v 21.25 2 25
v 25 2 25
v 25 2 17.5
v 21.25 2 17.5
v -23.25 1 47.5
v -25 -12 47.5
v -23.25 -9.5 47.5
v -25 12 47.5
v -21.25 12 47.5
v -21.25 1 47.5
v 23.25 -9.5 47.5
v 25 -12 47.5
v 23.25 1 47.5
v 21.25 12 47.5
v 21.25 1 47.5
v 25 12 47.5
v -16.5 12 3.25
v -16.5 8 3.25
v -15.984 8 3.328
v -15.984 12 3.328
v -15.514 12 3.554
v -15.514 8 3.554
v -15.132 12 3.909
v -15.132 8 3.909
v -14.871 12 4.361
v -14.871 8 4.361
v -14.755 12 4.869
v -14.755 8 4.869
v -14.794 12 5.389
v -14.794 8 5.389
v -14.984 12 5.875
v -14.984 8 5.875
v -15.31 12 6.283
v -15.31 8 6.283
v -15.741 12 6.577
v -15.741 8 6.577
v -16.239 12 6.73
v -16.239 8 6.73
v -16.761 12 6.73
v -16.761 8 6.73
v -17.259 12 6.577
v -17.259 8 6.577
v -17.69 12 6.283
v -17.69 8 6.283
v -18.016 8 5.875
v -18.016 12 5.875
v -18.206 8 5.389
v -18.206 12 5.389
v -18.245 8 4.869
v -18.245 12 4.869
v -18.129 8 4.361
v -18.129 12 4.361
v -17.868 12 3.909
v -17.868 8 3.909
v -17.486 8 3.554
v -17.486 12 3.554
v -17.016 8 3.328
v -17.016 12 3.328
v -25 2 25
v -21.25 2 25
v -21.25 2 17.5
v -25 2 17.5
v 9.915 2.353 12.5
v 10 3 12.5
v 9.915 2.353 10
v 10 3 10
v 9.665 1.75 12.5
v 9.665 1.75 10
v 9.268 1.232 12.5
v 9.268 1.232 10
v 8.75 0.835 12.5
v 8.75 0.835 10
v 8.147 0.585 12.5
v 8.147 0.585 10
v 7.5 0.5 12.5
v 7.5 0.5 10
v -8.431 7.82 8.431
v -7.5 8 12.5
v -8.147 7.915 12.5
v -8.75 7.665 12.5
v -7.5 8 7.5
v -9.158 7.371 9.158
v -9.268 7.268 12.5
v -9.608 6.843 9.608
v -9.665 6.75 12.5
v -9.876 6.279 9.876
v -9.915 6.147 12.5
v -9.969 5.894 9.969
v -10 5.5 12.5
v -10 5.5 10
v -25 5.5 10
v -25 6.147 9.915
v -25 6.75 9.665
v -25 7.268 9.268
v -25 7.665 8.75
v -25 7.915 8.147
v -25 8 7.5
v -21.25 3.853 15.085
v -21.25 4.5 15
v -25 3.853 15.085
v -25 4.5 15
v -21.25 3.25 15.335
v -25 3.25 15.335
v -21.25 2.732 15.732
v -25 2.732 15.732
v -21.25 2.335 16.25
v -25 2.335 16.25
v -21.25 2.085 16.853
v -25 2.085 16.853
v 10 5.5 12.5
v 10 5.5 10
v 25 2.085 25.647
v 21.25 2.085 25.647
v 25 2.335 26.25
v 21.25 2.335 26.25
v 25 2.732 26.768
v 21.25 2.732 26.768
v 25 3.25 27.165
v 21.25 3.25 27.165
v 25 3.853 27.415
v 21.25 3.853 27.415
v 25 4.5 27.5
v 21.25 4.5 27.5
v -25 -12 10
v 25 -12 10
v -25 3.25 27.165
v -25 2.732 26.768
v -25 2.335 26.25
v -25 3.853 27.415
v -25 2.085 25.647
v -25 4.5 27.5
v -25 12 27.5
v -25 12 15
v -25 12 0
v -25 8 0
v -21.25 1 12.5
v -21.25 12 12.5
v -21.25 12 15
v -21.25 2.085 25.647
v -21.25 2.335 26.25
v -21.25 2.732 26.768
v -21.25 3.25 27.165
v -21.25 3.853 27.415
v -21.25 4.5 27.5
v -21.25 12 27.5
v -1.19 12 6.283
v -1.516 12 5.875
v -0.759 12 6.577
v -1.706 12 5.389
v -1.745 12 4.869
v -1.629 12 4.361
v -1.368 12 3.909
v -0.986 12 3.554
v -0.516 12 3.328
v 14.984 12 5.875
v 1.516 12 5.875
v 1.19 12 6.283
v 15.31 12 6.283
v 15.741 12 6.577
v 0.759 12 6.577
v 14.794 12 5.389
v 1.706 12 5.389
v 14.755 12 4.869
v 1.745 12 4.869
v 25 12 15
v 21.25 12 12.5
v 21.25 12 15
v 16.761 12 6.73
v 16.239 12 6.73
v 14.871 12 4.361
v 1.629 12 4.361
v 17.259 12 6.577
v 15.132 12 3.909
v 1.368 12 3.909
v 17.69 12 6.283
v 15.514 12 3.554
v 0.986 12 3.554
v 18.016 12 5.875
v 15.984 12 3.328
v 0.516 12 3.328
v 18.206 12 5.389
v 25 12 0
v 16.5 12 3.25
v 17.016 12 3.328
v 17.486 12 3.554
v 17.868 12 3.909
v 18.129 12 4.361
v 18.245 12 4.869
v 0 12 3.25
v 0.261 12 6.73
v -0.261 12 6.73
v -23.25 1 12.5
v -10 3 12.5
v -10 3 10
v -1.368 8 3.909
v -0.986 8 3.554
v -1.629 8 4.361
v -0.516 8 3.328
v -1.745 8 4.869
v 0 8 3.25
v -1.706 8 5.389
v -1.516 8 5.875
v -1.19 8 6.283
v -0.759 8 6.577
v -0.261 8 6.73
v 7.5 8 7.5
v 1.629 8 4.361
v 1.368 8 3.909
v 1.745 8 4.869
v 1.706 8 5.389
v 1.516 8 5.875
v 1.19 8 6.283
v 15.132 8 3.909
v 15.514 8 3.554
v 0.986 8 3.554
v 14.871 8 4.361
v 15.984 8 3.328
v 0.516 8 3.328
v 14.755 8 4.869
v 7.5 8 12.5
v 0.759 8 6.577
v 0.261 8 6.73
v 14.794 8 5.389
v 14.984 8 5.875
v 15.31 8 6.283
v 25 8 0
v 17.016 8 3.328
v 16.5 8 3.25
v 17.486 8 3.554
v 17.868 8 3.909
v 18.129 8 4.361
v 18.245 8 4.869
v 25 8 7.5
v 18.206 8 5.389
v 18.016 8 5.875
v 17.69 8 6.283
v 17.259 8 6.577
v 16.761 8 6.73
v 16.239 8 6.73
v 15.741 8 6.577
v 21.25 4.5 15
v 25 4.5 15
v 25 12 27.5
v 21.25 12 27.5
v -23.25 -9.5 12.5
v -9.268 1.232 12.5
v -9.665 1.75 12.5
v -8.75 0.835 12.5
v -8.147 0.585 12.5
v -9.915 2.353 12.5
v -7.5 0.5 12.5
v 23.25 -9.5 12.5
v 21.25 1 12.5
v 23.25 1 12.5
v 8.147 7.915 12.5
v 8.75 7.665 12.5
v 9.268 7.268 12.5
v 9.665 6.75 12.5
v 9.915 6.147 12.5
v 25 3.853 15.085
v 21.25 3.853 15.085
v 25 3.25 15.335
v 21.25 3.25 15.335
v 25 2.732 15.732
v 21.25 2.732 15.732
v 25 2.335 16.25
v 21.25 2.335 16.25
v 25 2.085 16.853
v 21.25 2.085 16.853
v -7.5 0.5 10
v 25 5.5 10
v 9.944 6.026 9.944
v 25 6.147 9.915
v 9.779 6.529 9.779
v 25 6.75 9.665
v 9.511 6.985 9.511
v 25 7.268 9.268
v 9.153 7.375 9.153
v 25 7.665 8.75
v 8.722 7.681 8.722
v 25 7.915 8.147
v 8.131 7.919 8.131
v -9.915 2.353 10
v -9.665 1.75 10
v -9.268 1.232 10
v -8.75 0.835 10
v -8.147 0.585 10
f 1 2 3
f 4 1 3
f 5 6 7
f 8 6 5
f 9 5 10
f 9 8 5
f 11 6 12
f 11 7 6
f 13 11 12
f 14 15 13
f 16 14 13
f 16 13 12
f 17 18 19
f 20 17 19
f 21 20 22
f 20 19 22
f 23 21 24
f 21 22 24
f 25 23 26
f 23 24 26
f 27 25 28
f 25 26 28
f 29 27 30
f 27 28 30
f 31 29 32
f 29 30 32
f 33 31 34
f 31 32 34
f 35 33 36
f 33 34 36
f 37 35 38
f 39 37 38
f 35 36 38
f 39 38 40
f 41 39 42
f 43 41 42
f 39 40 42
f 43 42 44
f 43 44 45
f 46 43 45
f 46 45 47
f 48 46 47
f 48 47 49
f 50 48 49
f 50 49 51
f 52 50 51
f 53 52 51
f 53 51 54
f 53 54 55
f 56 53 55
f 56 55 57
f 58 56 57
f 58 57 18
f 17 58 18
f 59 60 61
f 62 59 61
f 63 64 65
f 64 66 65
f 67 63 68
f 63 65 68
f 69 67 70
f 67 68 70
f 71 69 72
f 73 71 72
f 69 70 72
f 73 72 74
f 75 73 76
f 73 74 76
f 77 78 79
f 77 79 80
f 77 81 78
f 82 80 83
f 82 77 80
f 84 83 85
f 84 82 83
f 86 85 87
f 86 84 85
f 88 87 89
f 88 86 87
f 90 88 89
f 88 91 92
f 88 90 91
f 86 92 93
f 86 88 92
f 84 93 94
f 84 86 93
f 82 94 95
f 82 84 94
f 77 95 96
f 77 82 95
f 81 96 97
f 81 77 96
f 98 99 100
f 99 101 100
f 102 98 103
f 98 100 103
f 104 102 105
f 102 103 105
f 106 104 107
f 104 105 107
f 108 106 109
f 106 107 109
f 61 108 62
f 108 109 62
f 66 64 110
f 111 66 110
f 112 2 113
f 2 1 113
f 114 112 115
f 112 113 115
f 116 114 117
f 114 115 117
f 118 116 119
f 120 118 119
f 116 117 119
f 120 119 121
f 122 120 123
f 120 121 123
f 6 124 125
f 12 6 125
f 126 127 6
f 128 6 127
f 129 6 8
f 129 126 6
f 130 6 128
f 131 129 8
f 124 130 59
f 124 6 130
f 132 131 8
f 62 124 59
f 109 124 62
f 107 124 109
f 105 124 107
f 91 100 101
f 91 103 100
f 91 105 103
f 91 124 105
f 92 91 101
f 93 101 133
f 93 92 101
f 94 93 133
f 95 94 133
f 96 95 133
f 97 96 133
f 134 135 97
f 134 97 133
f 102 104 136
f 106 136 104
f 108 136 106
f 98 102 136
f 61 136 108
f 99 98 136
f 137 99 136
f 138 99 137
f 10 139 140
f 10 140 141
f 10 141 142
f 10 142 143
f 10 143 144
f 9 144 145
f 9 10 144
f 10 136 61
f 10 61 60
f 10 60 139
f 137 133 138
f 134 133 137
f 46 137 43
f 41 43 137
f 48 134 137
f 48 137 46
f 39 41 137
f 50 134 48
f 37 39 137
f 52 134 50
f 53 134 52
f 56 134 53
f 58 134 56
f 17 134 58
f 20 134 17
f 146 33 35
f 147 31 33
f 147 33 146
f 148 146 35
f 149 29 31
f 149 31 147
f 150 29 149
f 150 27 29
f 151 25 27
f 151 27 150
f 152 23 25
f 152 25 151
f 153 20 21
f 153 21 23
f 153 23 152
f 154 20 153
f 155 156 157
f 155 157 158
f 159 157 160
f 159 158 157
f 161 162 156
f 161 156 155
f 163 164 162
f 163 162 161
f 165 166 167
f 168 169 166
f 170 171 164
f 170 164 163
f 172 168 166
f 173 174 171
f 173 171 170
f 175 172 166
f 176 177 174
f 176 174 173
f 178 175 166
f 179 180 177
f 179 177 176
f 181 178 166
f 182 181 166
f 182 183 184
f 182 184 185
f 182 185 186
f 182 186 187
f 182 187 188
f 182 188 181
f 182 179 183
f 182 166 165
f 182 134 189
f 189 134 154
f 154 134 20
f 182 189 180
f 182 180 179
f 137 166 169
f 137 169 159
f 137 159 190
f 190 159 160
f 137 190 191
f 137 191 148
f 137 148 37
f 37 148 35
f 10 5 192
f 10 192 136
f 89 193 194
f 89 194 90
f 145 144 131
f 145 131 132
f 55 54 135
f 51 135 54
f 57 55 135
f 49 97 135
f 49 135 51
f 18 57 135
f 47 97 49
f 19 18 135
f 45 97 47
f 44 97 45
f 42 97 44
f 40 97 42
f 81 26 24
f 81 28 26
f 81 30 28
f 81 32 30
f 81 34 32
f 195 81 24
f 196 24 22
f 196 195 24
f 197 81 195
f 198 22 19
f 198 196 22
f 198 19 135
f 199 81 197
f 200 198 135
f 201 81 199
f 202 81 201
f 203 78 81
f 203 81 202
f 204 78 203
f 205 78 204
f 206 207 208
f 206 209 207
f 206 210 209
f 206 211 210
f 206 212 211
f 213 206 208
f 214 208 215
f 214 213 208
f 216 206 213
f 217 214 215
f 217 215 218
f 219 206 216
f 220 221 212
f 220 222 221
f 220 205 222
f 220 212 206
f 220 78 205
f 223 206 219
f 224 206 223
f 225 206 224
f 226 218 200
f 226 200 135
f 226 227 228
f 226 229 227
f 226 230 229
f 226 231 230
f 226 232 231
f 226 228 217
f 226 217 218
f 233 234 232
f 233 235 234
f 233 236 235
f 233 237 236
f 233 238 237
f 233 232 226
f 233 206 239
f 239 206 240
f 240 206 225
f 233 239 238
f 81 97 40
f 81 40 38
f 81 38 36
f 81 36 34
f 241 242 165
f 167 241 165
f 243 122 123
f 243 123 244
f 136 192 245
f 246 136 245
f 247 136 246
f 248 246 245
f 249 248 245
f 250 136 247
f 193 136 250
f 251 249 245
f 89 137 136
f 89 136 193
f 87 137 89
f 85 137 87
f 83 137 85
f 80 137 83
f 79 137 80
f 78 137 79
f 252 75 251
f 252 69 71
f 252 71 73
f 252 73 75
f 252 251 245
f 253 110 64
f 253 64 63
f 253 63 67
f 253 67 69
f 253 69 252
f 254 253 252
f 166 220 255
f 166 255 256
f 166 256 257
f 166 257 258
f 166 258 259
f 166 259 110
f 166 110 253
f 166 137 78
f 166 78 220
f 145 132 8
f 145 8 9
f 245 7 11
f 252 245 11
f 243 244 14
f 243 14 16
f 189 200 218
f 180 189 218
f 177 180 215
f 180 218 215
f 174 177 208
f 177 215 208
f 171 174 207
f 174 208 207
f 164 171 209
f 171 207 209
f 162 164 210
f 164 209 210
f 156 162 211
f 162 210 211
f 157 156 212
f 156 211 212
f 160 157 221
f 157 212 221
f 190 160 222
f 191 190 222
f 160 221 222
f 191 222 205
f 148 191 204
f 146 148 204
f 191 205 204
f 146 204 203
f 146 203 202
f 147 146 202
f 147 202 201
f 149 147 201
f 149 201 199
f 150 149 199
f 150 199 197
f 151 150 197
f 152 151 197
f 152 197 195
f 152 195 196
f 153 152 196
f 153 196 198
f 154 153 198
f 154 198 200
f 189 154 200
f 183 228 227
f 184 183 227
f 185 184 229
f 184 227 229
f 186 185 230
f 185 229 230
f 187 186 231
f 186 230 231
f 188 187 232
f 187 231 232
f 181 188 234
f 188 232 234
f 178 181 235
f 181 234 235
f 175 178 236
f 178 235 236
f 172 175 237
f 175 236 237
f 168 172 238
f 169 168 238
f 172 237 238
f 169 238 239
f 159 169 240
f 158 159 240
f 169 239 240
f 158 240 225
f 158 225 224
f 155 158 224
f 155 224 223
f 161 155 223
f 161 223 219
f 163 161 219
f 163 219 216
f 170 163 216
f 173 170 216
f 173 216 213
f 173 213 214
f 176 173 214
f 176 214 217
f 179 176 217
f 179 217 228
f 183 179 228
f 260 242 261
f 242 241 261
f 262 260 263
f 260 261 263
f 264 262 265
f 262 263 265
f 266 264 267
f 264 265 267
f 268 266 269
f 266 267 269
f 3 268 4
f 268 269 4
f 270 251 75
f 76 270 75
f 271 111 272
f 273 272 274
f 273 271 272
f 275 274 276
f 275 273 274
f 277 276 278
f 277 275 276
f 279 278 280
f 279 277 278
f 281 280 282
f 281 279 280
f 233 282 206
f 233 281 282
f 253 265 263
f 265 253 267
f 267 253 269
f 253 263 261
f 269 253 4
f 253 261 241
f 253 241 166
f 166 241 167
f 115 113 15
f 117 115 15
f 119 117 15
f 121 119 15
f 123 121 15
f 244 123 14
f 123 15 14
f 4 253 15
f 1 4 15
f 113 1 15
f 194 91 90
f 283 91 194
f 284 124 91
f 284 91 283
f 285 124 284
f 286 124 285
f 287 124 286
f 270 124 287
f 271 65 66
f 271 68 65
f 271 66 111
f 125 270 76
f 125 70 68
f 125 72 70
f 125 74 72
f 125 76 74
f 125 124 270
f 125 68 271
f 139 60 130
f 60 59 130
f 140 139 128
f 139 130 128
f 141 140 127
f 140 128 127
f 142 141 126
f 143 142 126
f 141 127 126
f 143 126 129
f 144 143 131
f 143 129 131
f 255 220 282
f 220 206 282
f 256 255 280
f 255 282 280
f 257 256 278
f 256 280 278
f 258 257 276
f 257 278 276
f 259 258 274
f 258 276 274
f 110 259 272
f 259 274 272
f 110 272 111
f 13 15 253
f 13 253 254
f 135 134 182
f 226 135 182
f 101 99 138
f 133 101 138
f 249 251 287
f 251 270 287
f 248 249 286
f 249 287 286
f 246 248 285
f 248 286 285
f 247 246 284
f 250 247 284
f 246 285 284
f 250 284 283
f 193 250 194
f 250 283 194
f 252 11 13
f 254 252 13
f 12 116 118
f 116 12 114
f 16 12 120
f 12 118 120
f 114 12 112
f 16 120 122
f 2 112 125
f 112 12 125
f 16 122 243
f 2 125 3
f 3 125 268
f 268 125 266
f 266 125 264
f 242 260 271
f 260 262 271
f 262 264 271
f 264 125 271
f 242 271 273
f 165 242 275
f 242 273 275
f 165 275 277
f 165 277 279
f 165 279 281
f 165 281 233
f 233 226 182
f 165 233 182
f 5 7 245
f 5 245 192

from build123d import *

# Parameters (mm, degrees)
SKETCH2_W           = 50
SKETCH2_H           = 24
SKETCH2_W_2         = 46.5
SKETCH2_H_2         = 10.5
SKETCH2_W_3         = 42.5
SKETCH2_H_3         = 11
BOSS_EXTRUDE1_DEPTH = 47.5
CUT_EXTRUDE1_START  = 47.5
SKETCH2_3_W         = 46.5
SKETCH2_3_H         = 10.5
SKETCH2_3_W_2       = 42.5
SKETCH2_3_H_2       = 11
CUT_EXTRUDE1_DEPTH  = 35
SKETCH3_W           = 50
SKETCH3_H           = 10
SKETCH3_R           = 1.75
CUT_EXTRUDE2_DEPTH  = 20
SKETCH3_3_R         = 1.75
CUT_EXTRUDE3_DEPTH  = 24
CUT_EXTRUDE4_REACH  = 72.002
SKETCH4_W           = 12.5
SKETCH4_H           = 10
SKETCH5_W           = 20
SKETCH5_H           = 7.5
CUT_EXTRUDE5_DEPTH  = 2.5
FILLET1_R           = 2.5


with BuildPart() as part:
    # Sketch2 → Boss-Extrude1 (new body)
    # profile 1 of 3: a face of its own
    with BuildSketch(Plane.XY):
        Rectangle(SKETCH2_W, SKETCH2_H)
        with Locations((0, -4.25)):
            Rectangle(SKETCH2_W_2, SKETCH2_H_2, mode=Mode.SUBTRACT)
    # profile 2 of 3: a face of its own
    with BuildSketch(Plane.XY):
        with Locations((0, -4.25)):
            Rectangle(SKETCH2_W_2, SKETCH2_H_2)
    # profile 3 of 3: a face of its own
    with BuildSketch(Plane.XY):
        with Locations((0, 6.5)):
            Rectangle(SKETCH2_W_3, SKETCH2_H_3)
    extrude(amount=BOSS_EXTRUDE1_DEPTH)

    # Sketch2<3> → Cut-Extrude1 (cut)
    with BuildSketch(Plane.XY.offset(CUT_EXTRUDE1_START)):
        with Locations((0, -4.25)):
            Rectangle(SKETCH2_3_W, SKETCH2_3_H)
        with Locations((0, 6.5)):
            Rectangle(SKETCH2_3_W_2, SKETCH2_3_H_2)
    extrude(amount=-CUT_EXTRUDE1_DEPTH, mode=Mode.SUBTRACT)

    # Sketch3 → Cut-Extrude2 (cut)
    # profile 1 of 4: a face of its own
    with BuildSketch(Plane.XZ.offset(12)):
        with Locations((0, 5)):
            Rectangle(SKETCH3_W, SKETCH3_H)
        with Locations((-16.5, 5)):
            Circle(SKETCH3_R, mode=Mode.SUBTRACT)
        with Locations((0, 5)):
            Circle(SKETCH3_R, mode=Mode.SUBTRACT)
        with Locations((16.5, 5)):
            Circle(SKETCH3_R, mode=Mode.SUBTRACT)
    # profile 2 of 4: a face of its own
    with BuildSketch(Plane.XZ.offset(12)):
        with Locations((-16.5, 5)):
            Circle(SKETCH3_R)
    # profile 3 of 4: a face of its own
    with BuildSketch(Plane.XZ.offset(12)):
        with Locations((0, 5)):
            Circle(SKETCH3_R)
    # profile 4 of 4: a face of its own
    with BuildSketch(Plane.XZ.offset(12)):
        with Locations((16.5, 5)):
            Circle(SKETCH3_R)
    extrude(amount=-CUT_EXTRUDE2_DEPTH, mode=Mode.SUBTRACT)

    # Sketch3<3> → Cut-Extrude3 (cut)
    with BuildSketch(Plane.XZ.offset(12)):
        with Locations(Location((-16.5, 5, 0), (0, 0, 270))):
            Circle(SKETCH3_3_R)
        with Locations(Location((0, 5, 0), (0, 0, 270))):
            Circle(SKETCH3_3_R)
        with Locations(Location((16.5, 5, 0), (0, 0, 270))):
            Circle(SKETCH3_3_R)
    extrude(amount=-CUT_EXTRUDE3_DEPTH, mode=Mode.SUBTRACT)

    # Cut-Extrude4: up to this face of the body (flat: up to its plane)
    cut_extrude4_end = Plane(part.part.faces().sort_by_distance((-25, 0.425531915, 27.739361702))[0])
    # Sketch4 → Cut-Extrude4 (cut, up to the picked face)
    with BuildSketch(Plane(origin=(25, 0, 0), x_dir=(0, 0, -1), z_dir=(1, 0, 0)), mode=Mode.PRIVATE) as cut_extrude4_sk1:
        with Locations((-21.25, 7)):
            Rectangle(SKETCH4_W, SKETCH4_H)
    cut_extrude4_tool1 = split(extrude(cut_extrude4_sk1.sketch, amount=-CUT_EXTRUDE4_REACH, mode=Mode.PRIVATE), bisect_by=cut_extrude4_end, keep=Keep.BOTH, mode=Mode.PRIVATE)
    add(cut_extrude4_tool1.solids().sort_by(Axis((25, 7, 21.25), (-1, 0, 0)))[0], mode=Mode.SUBTRACT)

    # Sketch5 → Cut-Extrude5 (cut)
    with BuildSketch(Plane.XY.offset(12.5)):
        with Locations((0, 4.25)):
            Rectangle(SKETCH5_W, SKETCH5_H)
    extrude(amount=-CUT_EXTRUDE5_DEPTH, mode=Mode.SUBTRACT)

    # Fillet1
    fillet1_edges = [part.edges().sort_by_distance(p)[0] for p in [
        (-23.125, 2, 15),
        (-23.125, 2, 27.5),
        (23.125, 2, 15),
        (23.125, 2, 27.5),
        (17.5, 8, 10),
        (-10, 8, 11.25),
        (10, 8, 11.25),
        (10, 0.5, 11.25),
        (-10, 0.5, 11.25),
        (-17.5, 8, 10),
    ]]
    fillet(fillet1_edges, radius=FILLET1_R)


solid = part.part
